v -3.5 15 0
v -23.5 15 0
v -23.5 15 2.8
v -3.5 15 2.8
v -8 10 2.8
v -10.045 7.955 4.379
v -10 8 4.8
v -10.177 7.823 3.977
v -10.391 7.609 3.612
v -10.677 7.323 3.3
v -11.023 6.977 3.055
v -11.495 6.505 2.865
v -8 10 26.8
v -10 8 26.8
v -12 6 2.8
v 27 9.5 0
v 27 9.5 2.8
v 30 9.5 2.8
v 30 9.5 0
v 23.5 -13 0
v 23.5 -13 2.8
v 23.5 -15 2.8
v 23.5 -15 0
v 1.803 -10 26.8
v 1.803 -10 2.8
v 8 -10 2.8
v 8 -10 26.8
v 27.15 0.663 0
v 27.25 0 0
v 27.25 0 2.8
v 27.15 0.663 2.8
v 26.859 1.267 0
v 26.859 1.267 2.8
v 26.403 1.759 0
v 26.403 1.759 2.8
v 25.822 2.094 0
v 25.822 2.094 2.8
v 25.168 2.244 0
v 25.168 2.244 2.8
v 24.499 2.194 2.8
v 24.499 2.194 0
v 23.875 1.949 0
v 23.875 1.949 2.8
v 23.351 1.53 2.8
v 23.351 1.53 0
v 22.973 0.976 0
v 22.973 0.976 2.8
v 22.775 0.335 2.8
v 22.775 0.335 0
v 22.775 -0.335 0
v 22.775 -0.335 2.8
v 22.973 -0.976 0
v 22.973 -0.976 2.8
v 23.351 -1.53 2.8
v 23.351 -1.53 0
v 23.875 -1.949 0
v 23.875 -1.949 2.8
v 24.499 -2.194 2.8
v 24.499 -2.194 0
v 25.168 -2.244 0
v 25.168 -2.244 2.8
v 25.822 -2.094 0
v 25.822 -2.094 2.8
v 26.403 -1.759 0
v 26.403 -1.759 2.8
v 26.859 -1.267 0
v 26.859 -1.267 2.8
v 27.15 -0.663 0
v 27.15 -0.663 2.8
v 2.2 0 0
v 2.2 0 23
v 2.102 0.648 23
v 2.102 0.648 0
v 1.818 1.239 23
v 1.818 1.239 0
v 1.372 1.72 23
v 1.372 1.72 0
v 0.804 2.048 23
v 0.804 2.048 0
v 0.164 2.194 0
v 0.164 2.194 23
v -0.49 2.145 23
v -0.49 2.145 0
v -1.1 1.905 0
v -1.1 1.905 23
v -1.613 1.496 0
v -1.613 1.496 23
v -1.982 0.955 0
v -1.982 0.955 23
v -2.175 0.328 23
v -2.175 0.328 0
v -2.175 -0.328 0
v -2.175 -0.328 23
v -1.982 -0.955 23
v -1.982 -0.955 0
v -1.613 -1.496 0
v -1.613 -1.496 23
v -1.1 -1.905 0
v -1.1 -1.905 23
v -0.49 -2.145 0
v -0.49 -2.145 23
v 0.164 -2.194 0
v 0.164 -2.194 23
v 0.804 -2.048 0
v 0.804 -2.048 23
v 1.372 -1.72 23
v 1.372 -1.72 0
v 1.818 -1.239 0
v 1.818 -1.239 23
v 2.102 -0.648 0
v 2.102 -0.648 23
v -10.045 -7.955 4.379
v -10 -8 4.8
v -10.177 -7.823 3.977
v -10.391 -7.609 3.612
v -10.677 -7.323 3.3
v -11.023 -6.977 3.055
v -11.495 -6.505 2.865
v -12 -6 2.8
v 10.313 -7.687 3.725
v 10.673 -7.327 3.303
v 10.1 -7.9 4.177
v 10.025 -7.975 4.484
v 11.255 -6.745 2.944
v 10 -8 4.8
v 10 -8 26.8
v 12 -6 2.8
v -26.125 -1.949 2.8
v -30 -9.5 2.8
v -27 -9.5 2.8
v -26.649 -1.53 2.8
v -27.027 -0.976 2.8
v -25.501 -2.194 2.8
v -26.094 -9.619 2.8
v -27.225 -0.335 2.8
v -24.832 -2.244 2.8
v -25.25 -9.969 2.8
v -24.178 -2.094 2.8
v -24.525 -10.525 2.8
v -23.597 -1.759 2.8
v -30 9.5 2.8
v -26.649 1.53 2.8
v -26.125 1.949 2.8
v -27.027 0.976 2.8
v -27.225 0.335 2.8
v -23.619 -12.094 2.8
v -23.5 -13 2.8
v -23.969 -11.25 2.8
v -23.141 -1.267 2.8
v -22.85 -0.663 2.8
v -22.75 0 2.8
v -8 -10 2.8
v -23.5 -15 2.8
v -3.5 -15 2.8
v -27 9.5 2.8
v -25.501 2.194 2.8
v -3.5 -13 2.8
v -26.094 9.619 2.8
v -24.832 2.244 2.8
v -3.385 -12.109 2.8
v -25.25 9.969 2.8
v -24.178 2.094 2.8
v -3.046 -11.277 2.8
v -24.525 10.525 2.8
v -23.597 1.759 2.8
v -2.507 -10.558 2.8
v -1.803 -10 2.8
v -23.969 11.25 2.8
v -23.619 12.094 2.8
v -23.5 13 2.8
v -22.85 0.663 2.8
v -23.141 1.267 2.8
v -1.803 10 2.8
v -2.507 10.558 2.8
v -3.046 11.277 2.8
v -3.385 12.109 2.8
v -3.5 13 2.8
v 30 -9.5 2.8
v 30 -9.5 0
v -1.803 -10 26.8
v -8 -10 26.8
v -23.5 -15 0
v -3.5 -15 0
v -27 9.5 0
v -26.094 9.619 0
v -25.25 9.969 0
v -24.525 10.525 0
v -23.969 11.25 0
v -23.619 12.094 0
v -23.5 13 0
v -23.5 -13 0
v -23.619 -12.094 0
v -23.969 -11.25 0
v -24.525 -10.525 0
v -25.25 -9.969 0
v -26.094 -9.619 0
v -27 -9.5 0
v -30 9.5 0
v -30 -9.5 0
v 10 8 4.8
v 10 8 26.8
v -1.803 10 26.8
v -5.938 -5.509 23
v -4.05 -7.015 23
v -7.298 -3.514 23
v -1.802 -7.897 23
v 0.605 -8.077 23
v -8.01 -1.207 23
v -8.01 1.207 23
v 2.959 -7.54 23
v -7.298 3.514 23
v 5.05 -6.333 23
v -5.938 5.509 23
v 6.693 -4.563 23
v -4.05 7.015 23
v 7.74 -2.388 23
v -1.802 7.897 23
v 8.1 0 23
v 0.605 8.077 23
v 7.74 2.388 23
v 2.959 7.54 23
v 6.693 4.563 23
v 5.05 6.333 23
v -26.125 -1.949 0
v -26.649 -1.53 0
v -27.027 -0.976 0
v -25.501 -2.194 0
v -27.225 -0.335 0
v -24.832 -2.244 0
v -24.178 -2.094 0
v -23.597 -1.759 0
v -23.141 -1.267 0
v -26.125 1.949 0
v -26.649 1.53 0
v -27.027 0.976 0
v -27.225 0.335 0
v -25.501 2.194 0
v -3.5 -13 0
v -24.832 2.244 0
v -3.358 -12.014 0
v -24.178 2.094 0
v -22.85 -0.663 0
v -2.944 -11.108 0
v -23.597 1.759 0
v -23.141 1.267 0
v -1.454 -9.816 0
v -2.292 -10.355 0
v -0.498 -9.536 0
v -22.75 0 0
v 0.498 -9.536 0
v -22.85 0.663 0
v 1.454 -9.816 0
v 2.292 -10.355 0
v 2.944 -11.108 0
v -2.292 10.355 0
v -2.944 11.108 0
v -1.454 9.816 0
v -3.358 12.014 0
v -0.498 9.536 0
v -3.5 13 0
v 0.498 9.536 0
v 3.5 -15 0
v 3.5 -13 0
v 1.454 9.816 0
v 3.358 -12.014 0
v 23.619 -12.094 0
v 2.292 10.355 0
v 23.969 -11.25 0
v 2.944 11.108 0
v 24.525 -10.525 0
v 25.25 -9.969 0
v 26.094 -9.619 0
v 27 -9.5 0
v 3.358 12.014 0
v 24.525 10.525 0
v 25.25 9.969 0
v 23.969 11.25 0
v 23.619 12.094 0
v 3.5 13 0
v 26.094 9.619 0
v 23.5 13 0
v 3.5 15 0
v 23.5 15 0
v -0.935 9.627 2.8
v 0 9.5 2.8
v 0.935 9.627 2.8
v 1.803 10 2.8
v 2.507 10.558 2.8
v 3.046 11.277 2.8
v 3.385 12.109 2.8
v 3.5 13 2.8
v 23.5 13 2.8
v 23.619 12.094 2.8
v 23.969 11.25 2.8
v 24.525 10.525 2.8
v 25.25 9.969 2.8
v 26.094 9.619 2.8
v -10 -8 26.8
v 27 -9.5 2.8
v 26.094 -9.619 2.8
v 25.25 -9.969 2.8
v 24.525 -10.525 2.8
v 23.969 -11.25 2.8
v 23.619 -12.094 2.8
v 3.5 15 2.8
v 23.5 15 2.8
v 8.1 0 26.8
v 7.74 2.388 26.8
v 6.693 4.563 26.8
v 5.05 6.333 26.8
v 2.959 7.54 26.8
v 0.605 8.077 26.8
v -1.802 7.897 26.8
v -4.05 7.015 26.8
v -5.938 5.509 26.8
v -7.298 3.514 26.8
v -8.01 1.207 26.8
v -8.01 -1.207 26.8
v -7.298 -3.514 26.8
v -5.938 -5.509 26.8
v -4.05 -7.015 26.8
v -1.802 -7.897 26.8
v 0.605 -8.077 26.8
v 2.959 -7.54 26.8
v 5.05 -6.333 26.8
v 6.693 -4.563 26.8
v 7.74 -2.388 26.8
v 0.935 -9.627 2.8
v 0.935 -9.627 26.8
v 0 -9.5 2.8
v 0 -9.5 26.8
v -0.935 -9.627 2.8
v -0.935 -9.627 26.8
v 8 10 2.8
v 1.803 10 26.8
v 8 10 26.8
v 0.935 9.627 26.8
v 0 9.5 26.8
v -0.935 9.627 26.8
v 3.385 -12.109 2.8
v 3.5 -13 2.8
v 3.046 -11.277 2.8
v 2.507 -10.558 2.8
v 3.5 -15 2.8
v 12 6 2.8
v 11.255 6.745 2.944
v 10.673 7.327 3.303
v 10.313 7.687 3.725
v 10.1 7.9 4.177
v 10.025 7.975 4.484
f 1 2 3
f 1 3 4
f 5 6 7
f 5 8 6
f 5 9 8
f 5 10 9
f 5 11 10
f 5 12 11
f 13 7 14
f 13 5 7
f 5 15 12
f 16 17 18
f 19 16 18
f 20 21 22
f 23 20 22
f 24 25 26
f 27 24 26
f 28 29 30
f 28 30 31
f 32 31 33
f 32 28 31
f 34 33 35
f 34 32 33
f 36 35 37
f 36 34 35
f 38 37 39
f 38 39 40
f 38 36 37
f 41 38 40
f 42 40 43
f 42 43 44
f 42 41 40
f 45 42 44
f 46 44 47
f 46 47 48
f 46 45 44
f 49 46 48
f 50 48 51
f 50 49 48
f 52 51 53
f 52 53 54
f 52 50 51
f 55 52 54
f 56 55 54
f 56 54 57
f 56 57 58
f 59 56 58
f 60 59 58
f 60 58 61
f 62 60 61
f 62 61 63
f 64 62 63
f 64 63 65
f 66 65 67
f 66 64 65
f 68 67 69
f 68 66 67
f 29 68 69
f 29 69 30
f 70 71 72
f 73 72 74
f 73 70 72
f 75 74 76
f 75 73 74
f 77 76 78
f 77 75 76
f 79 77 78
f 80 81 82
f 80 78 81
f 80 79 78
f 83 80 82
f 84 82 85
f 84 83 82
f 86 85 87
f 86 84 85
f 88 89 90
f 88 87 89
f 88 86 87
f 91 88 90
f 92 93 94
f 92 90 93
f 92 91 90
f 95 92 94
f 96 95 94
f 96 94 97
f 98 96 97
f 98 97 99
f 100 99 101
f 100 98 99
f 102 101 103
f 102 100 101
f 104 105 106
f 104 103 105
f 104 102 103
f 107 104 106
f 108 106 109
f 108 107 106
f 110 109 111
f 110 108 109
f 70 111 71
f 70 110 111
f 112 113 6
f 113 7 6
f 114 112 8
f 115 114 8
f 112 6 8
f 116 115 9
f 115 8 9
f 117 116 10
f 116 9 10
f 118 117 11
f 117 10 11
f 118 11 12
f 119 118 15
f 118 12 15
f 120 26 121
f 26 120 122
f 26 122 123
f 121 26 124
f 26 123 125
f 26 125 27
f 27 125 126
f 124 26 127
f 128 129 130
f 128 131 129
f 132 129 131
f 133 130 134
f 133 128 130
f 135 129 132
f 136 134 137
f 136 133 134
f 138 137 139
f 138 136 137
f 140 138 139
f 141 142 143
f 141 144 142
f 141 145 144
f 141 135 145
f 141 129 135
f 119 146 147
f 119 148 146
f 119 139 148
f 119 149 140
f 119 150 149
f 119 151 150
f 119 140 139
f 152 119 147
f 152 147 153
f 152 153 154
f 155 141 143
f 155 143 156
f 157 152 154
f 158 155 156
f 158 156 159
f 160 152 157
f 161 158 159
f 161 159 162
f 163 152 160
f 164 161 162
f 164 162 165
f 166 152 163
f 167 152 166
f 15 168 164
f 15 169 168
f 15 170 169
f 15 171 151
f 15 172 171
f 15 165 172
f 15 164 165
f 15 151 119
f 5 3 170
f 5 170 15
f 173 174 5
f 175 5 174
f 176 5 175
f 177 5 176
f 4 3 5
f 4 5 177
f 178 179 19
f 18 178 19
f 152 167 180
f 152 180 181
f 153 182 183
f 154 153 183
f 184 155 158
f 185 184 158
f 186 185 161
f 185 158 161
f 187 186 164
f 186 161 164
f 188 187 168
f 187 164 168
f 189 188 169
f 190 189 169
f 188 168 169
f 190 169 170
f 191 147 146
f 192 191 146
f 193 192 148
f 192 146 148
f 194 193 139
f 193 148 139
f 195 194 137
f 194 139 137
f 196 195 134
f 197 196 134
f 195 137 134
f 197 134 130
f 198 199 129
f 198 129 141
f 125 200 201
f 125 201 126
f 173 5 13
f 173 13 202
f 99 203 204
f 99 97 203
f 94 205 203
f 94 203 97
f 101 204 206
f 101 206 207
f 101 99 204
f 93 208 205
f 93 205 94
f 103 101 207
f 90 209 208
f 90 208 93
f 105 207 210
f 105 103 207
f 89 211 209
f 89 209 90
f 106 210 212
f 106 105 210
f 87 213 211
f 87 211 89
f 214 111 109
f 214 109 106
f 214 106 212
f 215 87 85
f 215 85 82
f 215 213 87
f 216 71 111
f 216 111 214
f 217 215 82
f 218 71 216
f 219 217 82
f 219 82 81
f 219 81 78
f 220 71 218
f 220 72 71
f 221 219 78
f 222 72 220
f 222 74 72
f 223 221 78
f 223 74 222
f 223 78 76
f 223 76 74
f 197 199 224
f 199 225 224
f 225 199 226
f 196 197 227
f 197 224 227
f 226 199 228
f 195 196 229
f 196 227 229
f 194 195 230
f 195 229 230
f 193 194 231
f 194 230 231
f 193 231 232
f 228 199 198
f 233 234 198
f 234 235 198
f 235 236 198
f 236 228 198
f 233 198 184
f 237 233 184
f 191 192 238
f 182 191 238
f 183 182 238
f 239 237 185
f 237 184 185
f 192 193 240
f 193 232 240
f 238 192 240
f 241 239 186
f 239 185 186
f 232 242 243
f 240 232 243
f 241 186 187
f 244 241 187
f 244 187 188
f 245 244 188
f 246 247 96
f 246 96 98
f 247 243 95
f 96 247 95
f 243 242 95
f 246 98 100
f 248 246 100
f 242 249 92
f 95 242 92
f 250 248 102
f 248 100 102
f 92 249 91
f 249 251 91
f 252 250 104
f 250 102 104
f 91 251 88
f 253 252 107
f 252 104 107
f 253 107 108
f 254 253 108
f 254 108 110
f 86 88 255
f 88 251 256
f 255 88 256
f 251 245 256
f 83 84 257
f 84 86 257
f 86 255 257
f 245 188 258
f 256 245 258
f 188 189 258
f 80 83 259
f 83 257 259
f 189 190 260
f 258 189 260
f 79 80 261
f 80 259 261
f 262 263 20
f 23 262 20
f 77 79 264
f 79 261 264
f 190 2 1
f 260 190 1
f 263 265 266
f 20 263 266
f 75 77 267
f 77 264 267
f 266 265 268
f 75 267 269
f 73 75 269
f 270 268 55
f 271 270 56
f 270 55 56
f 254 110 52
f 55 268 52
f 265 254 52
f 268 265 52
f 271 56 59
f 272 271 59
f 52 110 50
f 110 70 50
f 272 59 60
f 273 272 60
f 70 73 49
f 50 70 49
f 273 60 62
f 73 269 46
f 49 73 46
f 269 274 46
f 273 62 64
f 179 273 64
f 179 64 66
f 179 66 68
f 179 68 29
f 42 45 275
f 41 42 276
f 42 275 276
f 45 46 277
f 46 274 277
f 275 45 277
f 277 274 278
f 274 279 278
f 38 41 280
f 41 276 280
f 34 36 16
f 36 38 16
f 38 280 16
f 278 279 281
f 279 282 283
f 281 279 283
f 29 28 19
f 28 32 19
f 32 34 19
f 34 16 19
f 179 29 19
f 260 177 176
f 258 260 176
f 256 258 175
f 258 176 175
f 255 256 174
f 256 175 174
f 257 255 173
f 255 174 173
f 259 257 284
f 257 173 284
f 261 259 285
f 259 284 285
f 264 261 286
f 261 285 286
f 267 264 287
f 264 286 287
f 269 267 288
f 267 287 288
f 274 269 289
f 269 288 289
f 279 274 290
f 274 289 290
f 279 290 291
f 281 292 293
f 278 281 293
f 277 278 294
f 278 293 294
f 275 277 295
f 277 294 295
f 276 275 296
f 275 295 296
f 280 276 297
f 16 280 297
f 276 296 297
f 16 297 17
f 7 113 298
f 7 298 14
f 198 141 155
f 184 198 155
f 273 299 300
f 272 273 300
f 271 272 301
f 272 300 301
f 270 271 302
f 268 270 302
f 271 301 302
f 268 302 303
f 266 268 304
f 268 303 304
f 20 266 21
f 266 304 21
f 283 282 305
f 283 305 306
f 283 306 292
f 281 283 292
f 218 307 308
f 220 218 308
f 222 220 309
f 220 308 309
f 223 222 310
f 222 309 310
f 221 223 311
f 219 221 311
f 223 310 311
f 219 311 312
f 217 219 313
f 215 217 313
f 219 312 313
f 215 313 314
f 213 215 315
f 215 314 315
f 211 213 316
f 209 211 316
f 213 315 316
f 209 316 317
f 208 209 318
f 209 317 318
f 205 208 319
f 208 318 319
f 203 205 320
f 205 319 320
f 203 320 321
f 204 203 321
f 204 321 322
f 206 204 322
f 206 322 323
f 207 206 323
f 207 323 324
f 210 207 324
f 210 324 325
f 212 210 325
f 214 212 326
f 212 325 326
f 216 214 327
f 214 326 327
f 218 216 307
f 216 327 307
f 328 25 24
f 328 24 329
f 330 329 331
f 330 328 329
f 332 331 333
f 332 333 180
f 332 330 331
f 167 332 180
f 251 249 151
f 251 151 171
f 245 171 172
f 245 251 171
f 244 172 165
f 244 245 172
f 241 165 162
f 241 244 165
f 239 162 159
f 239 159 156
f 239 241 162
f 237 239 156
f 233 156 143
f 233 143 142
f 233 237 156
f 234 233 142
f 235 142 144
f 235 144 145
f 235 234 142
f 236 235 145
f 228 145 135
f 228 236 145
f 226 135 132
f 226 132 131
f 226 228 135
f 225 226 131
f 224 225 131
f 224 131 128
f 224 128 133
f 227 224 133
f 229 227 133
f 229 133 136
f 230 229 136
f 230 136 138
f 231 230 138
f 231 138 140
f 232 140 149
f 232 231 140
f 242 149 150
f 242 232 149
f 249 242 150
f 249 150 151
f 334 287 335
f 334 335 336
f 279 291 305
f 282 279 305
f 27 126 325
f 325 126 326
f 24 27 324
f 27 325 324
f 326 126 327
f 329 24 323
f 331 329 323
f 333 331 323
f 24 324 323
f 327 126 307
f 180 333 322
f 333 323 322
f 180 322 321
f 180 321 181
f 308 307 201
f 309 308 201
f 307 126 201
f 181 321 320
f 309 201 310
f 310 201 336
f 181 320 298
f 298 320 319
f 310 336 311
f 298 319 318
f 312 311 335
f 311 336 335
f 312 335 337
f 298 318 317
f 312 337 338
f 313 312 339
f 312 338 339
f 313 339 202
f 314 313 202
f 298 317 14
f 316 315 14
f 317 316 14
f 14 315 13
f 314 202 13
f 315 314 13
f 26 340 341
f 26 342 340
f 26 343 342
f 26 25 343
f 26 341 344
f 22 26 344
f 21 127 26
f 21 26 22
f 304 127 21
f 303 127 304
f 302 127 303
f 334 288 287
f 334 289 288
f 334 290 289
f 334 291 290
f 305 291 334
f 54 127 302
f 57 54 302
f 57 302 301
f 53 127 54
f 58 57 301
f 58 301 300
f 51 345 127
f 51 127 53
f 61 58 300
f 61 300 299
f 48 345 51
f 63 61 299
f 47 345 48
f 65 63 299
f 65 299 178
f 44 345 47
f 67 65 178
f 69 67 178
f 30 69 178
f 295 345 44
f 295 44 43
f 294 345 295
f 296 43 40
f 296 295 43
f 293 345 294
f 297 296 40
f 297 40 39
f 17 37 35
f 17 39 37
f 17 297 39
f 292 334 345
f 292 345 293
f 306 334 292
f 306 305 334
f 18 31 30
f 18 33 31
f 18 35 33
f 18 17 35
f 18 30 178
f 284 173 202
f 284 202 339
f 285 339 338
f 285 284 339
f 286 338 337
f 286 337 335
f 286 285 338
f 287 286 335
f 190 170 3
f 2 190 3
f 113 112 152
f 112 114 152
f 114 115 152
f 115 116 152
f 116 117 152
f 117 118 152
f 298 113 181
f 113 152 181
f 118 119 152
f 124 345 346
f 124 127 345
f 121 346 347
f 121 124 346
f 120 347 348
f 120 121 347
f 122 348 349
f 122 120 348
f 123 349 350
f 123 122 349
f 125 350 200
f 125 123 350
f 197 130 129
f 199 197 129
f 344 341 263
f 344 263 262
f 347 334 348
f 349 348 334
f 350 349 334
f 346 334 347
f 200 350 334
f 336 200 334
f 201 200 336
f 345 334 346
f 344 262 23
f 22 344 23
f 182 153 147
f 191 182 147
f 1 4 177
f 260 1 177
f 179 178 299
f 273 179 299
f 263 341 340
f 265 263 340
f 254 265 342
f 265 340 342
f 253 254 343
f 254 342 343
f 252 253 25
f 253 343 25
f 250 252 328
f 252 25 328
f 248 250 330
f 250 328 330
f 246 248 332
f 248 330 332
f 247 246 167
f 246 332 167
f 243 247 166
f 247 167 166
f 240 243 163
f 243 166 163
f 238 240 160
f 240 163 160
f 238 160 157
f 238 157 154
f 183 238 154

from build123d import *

# Parameters (mm, degrees)
SKETCH_W        = 60
SKETCH_H        = 30
SKETCH_R        = 2.25
SKETCH_R_2      = 2.2
PAD_DEPTH       = 2.8
SKETCH001_W     = 75
SKETCH001_H     = 45
POCKET_DEPTH    = 2.801
SKETCH002_R     = 2.2
PAD001_DEPTH    = 24
SKETCH003_R     = 8.1
POCKET001_DEPTH = 3.8
CHAMFER_SIZE    = 2
FILLET_R        = 2
FILLET001_R     = 2


with BuildPart() as part:
    # Sketch → Pad (new body)
    with BuildSketch(Plane.XY):
        Rectangle(SKETCH_W, SKETCH_H)
        with Locations((25, 0)):
            Circle(SKETCH_R, mode=Mode.SUBTRACT)
        with Locations((-25, 0)):
            Circle(SKETCH_R, mode=Mode.SUBTRACT)
        Circle(SKETCH_R_2, mode=Mode.SUBTRACT)
    extrude(amount=PAD_DEPTH)

    # Sketch001 → Pocket (cut, through all)
    with BuildSketch(Plane.XY.offset(2.8)):
        Rectangle(SKETCH001_W, SKETCH001_H)
        with BuildLine():
            ThreePointArc((-27, 9.5), (-24.525126, 10.525126), (-23.5, 13))
            Line((-23.5, 13), (-23.5, 18))
            Line((-23.5, 18), (-3.5, 18))
            Line((-3.5, 18), (-3.5, 13))
            ThreePointArc((-3.5, 13), (0, 9.5), (3.5, 13))
            Line((3.5, 13), (3.5, 18))
            Line((3.5, 18), (23.5, 18))
            Line((23.5, 18), (23.5, 13))
            ThreePointArc((23.5, 13), (24.525126, 10.525126), (27, 9.5))
            Line((27, 9.5), (32, 9.5))
            Line((32, 9.5), (32, -9.5))
            Line((32, -9.5), (27, -9.5))
            ThreePointArc((27, -9.5), (24.525128, -10.525124), (23.5, -12.999994))
            Line((23.5, -12.999994), (23.5, -17.999994))
            Line((23.5, -17.999994), (3.5, -17.999994))
            Line((3.5, -12.999994), (3.5, -17.999994))
            ThreePointArc((3.5, -12.999994), (-4e-06, -9.5), (-3.5, -13.000002))
            Line((-3.5, -13.000002), (-3.5, -18.000002))
            Line((-23.499999, -18.000002), (-3.5, -18.000002))
            Line((-23.499999, -18.000002), (-23.499999, -13.000002))
            ThreePointArc((-23.499999, -13.000002), (-24.525131, -10.525138), (-27, -9.500018))
            Line((-27, -9.500018), (-32, -9.500018))
            Line((-32, -9.500018), (-32, 9.5))
            Line((-32, 9.5), (-27, 9.5))
        make_face(mode=Mode.SUBTRACT)
    extrude(amount=-POCKET_DEPTH, mode=Mode.SUBTRACT)

    # Sketch002 → Pad001 (new body)
    with BuildSketch(Plane.XY.offset(2.8)):
        with BuildLine():
            Line((-10, -10), (-10, 10))
            Line((-10, 10), (-1.802776, 10))
            ThreePointArc((-1.802776, 10), (0, 9.5), (1.802776, 10))
            Line((1.802776, 10), (10, 10))
            Line((10, 10), (10, -10))
            Line((1.802776, -10), (10, -10))
            ThreePointArc((1.802776, -10), (0, -9.5), (-1.802776, -10))
            Line((-1.802776, -10), (-10, -10))
        make_face()
        Circle(SKETCH002_R, mode=Mode.SUBTRACT)
    extrude(amount=PAD001_DEPTH)

    # Sketch003 → Pocket001 (cut)
    with BuildSketch(Plane.XY.offset(26.8)):
        Circle(SKETCH003_R)
    extrude(amount=-POCKET001_DEPTH, mode=Mode.SUBTRACT)

    # Chamfer
    chamfer_edges = [part.edges().sort_by_distance(p)[0] for p in [
        (-10, -10, 14.8),
        (10, -10, 14.8),
        (-10, 10, 14.8),
        (10, 10, 14.8),
    ]]
    chamfer(chamfer_edges, length=CHAMFER_SIZE)

    # Fillet
    fillet_edges = [part.edges().sort_by_distance(p)[0] for p in [
        (-10, 0, 2.8),
    ]]
    fillet(fillet_edges, radius=FILLET_R)

    # Fillet001
    fillet001_edges = [part.edges().sort_by_distance(p)[0] for p in [
        (10, 0, 2.8),
    ]]
    fillet(fillet001_edges, radius=FILLET001_R)


solid = part.part
